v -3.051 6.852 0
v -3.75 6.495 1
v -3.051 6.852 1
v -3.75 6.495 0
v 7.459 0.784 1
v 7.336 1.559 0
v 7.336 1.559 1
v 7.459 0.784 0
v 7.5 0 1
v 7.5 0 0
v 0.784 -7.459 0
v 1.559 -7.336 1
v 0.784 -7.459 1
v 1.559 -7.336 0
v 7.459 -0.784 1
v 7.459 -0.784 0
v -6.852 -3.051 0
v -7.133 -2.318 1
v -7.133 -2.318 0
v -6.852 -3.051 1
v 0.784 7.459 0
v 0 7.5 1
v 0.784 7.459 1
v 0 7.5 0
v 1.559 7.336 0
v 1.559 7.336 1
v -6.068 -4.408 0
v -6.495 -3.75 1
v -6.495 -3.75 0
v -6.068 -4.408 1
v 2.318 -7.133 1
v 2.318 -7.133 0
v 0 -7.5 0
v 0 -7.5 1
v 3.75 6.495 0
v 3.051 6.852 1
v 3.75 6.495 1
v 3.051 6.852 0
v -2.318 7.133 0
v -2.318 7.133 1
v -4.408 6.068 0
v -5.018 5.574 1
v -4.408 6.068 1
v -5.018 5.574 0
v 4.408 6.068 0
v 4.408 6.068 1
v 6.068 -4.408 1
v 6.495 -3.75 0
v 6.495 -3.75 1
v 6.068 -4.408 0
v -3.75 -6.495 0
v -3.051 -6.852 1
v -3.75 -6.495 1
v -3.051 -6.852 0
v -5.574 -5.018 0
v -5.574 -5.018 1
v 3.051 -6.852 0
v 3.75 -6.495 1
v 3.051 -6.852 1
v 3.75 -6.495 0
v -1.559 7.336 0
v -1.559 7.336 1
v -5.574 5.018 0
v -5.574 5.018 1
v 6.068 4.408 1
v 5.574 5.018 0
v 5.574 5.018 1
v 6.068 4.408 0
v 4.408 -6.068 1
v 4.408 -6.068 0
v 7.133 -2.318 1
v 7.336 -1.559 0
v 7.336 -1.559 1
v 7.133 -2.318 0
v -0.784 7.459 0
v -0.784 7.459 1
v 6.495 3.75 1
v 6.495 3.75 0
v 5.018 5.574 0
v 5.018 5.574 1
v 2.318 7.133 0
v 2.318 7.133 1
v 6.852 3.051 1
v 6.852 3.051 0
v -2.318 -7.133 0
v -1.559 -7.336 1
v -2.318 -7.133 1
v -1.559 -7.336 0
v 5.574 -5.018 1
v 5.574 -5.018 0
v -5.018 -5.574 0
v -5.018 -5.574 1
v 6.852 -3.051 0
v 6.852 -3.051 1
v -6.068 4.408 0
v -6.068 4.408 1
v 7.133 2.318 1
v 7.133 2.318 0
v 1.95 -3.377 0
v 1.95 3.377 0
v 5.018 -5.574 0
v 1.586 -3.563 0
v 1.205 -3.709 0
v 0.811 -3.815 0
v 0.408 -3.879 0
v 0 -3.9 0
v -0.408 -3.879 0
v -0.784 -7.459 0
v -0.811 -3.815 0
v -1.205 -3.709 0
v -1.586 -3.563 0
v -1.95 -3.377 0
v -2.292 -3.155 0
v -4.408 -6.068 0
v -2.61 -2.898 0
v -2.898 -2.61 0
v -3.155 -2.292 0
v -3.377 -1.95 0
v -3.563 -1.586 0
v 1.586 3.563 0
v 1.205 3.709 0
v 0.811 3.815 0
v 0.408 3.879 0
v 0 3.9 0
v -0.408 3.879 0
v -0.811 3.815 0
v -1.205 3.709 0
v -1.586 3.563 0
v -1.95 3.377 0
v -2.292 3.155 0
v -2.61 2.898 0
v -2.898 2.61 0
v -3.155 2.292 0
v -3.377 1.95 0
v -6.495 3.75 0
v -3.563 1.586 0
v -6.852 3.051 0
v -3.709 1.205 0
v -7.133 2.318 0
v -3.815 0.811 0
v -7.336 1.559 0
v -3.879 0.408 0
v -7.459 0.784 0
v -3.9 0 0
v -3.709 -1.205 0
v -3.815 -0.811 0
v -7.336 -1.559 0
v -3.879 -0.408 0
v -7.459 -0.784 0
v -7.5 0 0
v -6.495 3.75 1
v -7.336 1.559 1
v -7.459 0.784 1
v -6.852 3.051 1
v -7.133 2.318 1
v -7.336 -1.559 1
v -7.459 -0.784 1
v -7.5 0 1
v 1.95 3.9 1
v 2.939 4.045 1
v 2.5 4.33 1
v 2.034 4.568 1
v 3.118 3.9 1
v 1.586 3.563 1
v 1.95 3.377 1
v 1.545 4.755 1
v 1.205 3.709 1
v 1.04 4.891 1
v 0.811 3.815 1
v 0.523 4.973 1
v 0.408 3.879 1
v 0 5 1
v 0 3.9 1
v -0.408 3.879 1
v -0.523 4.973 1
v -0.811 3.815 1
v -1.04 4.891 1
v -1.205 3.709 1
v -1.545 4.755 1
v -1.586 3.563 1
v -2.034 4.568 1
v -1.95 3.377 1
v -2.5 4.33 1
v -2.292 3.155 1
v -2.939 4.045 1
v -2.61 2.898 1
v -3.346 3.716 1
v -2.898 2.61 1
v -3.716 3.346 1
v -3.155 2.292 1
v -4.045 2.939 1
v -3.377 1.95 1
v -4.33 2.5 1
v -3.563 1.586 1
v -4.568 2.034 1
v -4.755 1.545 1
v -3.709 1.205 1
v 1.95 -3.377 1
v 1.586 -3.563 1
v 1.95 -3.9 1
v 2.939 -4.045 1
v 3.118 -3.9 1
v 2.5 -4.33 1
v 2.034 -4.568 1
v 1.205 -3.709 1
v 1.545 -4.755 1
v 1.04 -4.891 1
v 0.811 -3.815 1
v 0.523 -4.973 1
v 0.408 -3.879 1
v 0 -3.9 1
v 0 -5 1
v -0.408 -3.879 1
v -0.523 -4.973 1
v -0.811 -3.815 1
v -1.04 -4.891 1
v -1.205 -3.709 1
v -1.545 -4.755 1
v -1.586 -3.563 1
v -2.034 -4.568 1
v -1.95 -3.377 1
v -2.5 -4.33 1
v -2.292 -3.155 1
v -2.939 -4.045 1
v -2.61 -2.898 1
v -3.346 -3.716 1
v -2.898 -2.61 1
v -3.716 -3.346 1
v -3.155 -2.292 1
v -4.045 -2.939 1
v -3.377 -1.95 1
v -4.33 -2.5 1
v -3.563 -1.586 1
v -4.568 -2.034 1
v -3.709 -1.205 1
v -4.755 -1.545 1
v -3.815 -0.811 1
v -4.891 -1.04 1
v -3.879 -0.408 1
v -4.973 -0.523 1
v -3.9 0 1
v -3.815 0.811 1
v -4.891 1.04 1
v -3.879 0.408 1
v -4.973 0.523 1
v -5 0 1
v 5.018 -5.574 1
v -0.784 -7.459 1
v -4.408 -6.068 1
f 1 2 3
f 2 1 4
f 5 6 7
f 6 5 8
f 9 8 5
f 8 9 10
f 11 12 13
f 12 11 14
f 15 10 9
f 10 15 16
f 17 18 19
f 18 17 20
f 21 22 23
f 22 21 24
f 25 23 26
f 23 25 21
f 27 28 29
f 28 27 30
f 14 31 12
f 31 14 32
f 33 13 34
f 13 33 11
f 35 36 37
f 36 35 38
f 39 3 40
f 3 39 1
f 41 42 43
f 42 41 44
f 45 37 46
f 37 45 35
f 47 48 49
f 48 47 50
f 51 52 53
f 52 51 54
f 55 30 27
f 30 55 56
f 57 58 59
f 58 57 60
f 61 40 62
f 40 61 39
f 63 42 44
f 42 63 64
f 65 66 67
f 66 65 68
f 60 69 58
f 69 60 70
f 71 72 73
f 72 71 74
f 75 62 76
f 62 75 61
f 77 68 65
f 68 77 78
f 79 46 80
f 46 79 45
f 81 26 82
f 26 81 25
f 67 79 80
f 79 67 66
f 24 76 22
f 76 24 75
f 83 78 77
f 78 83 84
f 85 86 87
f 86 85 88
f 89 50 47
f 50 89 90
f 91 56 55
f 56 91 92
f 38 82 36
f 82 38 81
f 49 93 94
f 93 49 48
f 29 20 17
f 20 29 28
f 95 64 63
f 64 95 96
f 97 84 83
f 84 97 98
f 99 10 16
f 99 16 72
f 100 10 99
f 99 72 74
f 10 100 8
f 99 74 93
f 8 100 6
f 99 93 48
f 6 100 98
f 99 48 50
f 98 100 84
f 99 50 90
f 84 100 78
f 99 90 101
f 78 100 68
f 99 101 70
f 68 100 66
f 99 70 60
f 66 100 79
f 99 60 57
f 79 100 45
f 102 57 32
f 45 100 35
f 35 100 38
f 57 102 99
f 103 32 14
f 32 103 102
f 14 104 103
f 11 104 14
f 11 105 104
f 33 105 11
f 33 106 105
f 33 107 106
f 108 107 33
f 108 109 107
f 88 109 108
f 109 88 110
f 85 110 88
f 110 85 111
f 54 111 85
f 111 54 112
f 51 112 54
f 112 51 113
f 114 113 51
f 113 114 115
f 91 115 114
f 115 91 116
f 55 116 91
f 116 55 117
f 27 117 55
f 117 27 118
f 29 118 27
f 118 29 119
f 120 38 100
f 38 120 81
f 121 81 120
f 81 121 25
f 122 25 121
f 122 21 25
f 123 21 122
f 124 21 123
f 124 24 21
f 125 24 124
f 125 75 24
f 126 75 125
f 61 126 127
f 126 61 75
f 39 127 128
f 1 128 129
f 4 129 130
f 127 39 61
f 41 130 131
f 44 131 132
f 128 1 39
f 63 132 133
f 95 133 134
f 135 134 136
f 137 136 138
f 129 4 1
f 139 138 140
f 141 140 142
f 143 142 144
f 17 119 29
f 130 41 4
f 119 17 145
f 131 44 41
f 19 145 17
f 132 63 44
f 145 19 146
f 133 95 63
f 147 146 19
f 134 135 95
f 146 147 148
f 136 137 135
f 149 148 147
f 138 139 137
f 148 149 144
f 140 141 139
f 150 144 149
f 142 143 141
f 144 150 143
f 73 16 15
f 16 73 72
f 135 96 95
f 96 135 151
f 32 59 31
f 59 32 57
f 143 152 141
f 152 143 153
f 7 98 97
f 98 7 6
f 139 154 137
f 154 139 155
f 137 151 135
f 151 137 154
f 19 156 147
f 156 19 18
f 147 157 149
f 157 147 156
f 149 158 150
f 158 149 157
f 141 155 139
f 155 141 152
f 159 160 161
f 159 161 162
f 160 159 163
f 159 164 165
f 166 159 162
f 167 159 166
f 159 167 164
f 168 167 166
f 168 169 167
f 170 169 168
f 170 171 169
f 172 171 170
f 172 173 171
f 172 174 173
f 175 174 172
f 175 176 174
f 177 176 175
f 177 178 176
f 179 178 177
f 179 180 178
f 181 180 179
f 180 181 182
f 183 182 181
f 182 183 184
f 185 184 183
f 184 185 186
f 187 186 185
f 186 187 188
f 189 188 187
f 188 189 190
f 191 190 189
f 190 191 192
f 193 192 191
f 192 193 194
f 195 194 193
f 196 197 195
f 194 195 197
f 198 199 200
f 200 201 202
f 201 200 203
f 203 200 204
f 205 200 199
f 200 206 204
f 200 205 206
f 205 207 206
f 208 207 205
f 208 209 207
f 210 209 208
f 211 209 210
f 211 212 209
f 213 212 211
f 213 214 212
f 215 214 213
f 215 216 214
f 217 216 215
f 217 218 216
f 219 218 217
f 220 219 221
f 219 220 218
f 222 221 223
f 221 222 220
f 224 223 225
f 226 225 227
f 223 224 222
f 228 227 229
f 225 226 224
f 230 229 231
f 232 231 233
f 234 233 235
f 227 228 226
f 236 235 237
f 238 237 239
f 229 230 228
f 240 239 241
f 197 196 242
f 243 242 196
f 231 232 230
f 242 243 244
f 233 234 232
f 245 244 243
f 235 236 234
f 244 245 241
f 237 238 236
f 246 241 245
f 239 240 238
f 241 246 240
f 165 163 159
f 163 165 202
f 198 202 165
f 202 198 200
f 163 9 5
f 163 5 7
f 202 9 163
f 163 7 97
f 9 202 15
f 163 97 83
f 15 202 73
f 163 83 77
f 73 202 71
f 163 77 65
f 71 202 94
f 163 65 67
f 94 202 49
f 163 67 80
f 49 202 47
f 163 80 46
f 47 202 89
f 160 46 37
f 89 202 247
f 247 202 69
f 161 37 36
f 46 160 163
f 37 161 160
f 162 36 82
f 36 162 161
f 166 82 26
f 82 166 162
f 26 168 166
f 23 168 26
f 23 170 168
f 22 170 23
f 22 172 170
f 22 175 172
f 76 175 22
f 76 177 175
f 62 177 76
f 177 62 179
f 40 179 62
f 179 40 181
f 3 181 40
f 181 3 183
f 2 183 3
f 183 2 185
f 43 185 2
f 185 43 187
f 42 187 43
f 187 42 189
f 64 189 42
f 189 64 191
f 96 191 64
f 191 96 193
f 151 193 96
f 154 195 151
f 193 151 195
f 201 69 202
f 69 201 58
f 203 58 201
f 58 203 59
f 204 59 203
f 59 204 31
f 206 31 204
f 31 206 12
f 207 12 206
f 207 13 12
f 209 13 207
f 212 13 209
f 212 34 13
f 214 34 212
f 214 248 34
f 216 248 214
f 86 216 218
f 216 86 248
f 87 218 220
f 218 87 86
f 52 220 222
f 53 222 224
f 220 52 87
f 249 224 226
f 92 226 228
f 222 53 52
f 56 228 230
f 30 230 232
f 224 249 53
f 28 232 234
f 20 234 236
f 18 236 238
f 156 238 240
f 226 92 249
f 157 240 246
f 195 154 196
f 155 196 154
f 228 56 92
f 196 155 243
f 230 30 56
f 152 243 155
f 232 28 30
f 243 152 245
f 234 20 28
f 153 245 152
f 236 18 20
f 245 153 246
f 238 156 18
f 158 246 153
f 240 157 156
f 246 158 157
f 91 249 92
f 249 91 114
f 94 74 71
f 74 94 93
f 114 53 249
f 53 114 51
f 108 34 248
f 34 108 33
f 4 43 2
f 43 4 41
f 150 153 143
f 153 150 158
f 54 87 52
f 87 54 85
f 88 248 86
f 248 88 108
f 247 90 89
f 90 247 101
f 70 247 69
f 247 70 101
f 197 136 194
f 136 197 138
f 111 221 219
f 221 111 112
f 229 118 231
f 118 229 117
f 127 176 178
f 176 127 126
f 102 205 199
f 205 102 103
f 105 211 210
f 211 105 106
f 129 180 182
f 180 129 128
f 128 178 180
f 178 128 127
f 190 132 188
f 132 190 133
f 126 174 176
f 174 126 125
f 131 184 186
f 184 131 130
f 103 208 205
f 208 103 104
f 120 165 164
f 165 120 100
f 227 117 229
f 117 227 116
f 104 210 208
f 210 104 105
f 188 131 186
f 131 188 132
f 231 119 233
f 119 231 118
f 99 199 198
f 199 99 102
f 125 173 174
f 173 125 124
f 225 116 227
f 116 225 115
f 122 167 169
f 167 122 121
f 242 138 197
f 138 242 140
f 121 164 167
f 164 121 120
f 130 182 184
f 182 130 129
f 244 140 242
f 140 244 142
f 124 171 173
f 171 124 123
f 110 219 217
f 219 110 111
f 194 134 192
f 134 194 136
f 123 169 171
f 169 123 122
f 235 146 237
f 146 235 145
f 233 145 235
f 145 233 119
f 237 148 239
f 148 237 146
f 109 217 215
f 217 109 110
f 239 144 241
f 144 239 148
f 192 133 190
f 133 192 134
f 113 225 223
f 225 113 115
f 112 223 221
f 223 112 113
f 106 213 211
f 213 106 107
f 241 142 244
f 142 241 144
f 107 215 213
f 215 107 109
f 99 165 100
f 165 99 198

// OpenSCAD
// robot wheel for gear motors
$fn = 60;
diameter = 15;
rim_thickness = 1;
rim_diameter = 5; // subtracted from total diameter
disc_thickness = 1; 

// 4mm with cutout at 2 works but is sloppy
union(){
difference(){
cylinder(h = rim_thickness, r = diameter/2);
translate([0,0,disc_thickness])
    cylinder(h = disc_thickness, r = (diameter-rim_diameter)/2);
    
cylinder(h = disc_thickness, r = 3.9); //this size fits perfectly, sliding on with nearly no slop
}
translate([(3.9/2), -3.9, 0])
    cube([3.9, 7.8, disc_thickness]);
}
